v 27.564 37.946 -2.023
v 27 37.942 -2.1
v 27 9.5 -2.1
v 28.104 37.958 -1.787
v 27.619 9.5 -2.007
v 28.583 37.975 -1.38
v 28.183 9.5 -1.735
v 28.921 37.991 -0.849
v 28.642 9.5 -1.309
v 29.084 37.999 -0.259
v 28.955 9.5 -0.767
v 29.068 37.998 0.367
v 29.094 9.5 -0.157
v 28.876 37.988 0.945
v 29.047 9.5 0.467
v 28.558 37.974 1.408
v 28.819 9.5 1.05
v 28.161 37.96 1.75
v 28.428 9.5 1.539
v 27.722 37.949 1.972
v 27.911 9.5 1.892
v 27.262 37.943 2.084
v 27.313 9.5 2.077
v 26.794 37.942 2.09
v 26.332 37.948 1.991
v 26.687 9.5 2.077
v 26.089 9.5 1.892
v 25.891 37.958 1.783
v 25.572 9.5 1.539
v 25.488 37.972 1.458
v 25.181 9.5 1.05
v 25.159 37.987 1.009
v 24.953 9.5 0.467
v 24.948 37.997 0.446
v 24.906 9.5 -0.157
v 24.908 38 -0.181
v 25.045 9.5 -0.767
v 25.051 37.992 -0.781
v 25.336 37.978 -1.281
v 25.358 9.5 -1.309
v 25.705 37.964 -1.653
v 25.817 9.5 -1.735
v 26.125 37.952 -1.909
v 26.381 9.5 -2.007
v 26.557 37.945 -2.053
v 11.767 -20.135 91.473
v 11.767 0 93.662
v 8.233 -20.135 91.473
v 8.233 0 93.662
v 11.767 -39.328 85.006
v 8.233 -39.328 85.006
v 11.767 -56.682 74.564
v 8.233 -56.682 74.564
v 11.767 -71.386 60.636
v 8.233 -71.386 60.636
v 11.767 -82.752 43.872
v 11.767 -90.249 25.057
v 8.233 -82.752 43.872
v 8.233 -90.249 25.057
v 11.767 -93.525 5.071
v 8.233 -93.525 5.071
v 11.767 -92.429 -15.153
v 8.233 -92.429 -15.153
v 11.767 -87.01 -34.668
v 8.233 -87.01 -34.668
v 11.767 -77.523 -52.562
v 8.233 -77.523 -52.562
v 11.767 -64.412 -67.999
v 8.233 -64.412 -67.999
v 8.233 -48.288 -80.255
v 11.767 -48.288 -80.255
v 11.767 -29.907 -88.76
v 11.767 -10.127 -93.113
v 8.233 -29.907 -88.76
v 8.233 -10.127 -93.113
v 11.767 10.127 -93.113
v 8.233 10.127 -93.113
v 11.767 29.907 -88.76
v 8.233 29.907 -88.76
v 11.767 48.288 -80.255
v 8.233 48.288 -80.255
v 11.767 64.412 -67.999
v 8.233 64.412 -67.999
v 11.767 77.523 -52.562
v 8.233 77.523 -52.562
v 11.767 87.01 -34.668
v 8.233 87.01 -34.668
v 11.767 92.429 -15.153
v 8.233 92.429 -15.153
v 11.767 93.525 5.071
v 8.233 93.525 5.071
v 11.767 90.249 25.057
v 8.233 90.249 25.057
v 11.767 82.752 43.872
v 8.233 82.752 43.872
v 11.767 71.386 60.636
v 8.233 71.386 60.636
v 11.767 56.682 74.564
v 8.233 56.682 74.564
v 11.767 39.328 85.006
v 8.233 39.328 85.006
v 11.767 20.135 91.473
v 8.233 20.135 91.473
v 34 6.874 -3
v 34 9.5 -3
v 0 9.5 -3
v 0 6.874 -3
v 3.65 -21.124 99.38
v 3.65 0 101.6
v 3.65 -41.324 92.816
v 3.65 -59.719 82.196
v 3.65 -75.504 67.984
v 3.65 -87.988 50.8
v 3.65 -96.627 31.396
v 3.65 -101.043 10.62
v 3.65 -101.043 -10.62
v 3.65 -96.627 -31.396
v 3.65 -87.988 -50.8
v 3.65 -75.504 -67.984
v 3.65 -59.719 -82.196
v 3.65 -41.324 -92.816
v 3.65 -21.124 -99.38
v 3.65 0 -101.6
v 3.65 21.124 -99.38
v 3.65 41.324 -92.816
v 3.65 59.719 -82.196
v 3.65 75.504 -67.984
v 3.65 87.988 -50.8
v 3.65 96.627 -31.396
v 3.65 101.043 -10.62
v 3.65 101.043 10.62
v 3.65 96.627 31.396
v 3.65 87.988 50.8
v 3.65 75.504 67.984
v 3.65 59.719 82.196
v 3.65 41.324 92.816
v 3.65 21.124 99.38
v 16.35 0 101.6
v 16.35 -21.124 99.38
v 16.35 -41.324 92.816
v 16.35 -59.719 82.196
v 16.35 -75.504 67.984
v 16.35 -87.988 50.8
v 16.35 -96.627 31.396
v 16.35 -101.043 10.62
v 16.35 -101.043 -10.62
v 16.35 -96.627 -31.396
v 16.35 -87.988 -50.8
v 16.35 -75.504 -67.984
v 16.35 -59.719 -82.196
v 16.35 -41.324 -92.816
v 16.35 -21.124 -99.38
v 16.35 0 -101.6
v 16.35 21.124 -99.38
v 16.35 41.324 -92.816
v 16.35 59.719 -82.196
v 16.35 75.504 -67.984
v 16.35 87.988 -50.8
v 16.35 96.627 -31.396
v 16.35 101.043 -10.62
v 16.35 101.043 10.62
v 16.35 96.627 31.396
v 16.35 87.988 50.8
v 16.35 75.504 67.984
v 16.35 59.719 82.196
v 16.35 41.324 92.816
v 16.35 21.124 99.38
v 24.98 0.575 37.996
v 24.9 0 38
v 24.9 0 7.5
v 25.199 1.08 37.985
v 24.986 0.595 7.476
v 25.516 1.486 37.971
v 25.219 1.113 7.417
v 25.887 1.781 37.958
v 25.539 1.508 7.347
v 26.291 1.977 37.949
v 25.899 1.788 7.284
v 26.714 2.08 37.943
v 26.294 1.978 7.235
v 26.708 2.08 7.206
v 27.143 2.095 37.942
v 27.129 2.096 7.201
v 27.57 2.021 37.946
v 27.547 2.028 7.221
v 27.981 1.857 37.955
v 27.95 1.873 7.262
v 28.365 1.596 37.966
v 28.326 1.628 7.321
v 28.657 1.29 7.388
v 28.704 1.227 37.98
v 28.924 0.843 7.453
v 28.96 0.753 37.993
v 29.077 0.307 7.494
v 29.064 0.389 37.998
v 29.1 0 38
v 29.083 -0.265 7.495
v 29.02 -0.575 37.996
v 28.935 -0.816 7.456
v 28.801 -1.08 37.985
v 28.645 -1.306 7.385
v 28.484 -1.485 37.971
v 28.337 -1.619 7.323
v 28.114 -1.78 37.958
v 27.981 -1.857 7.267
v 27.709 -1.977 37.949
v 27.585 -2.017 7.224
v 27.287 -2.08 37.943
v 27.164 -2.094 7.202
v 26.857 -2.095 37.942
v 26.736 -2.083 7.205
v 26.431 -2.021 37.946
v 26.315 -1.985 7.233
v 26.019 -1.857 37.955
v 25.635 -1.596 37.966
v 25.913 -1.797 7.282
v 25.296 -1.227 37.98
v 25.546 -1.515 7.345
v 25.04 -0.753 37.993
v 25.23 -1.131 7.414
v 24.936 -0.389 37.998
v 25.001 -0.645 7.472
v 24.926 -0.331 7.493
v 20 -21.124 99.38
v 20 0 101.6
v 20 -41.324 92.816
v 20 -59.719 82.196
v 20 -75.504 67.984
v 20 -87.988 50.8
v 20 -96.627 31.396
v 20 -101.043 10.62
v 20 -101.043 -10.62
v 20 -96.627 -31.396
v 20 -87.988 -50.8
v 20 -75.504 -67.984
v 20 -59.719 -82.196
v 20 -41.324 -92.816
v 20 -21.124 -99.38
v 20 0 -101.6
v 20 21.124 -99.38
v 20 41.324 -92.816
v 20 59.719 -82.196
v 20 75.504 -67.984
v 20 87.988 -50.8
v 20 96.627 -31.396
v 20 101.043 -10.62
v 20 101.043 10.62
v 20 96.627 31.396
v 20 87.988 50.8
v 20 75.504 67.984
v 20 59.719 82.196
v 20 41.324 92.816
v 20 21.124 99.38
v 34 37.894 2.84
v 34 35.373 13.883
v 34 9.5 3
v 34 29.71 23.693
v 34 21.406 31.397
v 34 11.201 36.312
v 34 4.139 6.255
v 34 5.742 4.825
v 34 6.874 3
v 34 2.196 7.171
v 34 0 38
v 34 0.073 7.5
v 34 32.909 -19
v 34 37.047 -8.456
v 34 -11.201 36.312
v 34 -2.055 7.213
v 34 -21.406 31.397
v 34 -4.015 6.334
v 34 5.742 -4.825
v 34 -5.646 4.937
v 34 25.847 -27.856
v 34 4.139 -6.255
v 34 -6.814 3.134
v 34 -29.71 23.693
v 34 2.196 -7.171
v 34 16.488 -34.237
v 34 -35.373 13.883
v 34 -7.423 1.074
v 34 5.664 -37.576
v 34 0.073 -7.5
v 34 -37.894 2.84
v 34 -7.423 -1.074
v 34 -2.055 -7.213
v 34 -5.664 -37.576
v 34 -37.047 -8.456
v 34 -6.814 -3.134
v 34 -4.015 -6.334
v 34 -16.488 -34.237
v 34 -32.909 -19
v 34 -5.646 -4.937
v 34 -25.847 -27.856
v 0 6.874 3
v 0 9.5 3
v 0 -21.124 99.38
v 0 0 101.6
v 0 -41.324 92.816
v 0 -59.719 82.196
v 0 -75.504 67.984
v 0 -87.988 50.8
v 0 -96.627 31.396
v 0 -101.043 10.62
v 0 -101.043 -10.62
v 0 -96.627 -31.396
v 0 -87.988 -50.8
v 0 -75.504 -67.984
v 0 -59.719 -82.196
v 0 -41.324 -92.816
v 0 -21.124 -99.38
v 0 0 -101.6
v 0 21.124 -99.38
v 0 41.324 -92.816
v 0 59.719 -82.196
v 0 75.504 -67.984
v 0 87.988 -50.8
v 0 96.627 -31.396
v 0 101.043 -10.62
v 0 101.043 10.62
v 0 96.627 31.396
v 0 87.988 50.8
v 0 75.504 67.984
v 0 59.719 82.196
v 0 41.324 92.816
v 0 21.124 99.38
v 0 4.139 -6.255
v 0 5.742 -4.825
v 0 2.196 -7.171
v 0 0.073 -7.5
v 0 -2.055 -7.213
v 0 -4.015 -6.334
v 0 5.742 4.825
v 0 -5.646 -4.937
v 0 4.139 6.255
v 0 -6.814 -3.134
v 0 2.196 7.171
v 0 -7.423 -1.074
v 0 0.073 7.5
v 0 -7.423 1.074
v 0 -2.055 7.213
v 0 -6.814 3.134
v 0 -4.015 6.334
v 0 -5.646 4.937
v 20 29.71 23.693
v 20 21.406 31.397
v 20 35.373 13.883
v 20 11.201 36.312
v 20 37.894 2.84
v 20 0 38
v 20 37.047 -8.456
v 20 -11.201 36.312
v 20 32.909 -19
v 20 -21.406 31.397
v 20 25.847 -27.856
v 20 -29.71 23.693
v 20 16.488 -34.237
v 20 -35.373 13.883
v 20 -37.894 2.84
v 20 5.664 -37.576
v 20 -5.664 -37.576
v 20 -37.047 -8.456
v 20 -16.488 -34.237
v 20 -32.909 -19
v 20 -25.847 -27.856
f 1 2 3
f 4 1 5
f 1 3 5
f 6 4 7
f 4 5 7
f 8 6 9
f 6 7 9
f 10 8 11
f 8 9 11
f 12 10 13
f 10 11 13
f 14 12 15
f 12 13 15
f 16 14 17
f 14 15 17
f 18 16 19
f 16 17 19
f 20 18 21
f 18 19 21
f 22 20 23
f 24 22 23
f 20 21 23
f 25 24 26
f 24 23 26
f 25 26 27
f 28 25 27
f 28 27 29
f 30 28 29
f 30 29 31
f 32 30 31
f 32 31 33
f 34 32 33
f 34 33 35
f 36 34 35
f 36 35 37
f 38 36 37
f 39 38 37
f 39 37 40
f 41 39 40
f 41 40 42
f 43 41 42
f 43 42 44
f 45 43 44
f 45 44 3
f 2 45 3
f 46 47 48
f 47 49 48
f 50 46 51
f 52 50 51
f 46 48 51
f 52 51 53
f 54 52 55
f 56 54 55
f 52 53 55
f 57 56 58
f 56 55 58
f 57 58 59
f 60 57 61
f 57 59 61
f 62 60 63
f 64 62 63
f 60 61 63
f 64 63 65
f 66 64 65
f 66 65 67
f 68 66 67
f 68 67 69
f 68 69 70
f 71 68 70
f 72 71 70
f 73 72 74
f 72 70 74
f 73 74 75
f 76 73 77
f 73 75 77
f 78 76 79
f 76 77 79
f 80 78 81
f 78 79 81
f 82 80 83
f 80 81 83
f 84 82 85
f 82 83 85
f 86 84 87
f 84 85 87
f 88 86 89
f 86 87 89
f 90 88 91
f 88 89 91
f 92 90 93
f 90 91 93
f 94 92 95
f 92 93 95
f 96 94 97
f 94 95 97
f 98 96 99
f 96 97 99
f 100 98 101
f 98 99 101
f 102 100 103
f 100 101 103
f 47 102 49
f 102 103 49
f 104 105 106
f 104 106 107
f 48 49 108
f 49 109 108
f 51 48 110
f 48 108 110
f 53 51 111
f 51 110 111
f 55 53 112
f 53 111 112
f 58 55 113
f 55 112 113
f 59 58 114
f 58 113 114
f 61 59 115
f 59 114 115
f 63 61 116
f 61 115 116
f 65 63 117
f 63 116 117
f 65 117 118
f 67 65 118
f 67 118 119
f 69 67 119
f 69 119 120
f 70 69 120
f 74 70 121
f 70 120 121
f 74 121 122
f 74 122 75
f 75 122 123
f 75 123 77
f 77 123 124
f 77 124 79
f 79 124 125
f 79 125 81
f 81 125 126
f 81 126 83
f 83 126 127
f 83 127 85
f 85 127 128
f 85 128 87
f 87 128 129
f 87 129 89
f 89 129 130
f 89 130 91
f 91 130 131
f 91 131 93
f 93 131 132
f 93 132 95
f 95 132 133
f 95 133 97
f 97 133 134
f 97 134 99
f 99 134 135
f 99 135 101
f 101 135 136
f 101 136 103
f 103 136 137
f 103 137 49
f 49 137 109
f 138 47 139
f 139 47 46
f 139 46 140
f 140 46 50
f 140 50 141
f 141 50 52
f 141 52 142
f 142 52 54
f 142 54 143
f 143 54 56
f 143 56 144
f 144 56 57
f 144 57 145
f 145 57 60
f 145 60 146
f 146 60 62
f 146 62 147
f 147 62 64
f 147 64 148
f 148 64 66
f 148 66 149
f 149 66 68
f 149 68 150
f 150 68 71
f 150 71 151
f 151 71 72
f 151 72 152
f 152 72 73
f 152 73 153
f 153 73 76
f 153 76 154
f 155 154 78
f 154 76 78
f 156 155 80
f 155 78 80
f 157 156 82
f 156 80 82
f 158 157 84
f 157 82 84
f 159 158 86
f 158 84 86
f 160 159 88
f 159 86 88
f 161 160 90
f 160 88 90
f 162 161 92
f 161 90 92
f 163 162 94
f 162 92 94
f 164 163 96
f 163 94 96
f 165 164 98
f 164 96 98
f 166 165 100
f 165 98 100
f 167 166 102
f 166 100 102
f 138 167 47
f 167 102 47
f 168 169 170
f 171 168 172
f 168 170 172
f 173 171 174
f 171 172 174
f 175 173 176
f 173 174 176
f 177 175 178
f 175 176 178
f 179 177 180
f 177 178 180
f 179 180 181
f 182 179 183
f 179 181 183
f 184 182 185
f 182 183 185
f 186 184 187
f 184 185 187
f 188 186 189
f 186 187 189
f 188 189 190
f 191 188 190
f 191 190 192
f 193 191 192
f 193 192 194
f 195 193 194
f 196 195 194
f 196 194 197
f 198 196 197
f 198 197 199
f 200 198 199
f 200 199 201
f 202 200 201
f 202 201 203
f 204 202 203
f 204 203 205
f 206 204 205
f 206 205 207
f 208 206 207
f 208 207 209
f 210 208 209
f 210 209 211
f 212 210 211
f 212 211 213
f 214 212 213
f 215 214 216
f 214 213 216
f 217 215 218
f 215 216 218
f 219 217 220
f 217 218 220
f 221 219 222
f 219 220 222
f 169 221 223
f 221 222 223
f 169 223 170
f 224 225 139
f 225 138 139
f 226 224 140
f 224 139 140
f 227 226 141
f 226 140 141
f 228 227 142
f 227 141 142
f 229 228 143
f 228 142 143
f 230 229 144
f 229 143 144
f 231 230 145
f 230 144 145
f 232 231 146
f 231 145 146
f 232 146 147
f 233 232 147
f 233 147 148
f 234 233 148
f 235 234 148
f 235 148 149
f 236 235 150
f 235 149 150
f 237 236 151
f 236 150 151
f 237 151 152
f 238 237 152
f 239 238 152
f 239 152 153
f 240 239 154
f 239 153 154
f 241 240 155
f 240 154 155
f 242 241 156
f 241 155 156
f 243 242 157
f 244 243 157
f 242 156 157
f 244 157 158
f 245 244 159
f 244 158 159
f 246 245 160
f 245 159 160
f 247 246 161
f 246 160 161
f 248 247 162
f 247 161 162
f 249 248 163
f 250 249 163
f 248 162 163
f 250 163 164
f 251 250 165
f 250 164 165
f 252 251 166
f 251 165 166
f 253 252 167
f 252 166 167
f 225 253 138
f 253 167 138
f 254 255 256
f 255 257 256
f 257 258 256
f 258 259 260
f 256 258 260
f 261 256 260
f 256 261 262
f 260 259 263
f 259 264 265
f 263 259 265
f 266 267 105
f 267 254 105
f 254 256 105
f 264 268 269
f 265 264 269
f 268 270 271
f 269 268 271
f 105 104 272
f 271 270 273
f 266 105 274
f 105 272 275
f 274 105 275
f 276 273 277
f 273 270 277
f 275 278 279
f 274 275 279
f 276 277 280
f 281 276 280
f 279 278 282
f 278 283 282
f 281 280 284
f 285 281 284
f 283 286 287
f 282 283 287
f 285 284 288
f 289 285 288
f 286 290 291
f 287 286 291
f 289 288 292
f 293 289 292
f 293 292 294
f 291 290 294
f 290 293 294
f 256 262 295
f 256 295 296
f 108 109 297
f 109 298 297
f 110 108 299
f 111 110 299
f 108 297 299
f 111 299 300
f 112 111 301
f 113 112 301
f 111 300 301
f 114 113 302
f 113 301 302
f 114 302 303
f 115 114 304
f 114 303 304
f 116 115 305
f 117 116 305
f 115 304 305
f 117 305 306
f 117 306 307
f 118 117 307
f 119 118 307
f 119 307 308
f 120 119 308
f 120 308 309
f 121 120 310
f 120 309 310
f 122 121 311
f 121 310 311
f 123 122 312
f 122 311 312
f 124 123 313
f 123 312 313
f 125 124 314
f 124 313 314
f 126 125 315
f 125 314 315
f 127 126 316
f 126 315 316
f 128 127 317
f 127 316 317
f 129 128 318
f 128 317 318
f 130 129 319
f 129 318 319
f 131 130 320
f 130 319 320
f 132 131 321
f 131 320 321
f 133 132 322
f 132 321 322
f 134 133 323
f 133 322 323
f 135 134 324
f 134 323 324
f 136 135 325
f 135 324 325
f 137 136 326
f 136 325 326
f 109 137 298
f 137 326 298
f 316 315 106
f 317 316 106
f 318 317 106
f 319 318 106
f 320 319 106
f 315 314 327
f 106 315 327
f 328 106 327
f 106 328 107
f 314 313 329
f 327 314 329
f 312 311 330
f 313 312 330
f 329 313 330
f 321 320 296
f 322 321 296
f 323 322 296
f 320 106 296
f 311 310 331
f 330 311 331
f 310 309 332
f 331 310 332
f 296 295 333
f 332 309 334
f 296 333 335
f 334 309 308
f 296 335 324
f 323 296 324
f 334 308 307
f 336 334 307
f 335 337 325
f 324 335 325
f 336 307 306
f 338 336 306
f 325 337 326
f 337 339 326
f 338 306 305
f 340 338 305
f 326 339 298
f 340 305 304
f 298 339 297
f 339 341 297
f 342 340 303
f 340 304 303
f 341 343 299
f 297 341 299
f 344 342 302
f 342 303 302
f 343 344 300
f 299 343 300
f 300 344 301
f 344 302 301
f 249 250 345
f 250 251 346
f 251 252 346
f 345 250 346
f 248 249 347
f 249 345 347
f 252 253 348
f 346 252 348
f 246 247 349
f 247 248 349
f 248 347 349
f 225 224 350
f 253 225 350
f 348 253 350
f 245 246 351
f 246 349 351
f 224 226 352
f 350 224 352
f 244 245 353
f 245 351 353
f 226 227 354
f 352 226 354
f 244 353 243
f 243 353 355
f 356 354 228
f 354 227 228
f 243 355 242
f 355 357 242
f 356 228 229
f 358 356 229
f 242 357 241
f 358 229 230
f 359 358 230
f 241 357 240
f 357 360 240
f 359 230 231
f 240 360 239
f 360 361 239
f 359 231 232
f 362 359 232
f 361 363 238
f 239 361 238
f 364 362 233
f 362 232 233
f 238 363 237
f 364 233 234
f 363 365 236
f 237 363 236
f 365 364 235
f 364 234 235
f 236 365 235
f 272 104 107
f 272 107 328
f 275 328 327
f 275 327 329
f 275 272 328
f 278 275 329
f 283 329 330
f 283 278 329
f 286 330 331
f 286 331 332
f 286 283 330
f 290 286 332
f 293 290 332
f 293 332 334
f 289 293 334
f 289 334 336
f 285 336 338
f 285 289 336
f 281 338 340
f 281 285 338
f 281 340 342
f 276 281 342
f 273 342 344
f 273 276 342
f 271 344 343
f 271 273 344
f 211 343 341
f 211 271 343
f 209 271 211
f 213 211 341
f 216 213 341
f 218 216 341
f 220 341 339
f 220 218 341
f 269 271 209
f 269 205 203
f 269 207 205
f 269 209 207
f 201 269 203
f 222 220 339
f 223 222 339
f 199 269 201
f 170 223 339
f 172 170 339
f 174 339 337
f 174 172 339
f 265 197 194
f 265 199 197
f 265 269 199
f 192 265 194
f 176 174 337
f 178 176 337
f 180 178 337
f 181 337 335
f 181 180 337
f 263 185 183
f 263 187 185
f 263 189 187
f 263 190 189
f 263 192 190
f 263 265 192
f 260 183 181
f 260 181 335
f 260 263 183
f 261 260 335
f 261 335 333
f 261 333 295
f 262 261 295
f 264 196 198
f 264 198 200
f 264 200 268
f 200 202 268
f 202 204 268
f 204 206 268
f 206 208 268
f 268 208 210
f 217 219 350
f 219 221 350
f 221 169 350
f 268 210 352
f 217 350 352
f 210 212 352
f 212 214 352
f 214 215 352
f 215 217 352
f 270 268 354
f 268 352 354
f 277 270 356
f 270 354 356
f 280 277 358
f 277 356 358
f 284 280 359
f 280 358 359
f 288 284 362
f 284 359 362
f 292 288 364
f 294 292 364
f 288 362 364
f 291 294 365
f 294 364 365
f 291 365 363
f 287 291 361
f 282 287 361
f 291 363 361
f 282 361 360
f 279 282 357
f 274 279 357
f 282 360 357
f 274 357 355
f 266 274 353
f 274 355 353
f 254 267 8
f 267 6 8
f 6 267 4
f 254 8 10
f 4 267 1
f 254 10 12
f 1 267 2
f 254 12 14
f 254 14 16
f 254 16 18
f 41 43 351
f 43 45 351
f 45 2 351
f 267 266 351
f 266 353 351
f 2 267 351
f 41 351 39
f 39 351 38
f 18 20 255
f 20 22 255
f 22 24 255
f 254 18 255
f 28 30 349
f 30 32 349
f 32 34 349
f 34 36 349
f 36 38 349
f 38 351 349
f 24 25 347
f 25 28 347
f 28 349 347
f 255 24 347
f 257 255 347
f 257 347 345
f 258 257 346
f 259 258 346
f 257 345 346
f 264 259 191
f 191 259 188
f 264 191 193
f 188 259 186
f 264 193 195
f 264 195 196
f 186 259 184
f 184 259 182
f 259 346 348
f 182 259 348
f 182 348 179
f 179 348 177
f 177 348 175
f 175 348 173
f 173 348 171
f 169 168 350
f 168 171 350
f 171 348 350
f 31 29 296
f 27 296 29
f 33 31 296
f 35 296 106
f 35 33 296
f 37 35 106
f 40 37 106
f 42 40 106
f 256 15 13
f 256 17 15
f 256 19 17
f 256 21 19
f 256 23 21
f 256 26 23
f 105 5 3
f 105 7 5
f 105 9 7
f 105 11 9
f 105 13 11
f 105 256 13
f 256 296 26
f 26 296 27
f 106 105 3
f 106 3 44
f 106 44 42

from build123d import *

# Parameters (mm, degrees)
CORTAR_EXTRUIR1_DEPTH                          = 34
PERFORADOR_PARA_ROSCAR_PARA_MACHO_DE_ROS_D     = 4.2
PERFORADOR_PARA_ROSCAR_PARA_MACHO_DE_ROS_DEPTH = 40
PERFORADOR_PARA_ROSCAR_PARA_MACHO_DE_ROS_TIP   = 1.2618073
PERFORADOR_PARA_ROSCAR_PARA_MACHO_DE_2_D       = 4.2
PERFORADOR_PARA_ROSCAR_PARA_MACHO_DE_2_DEPTH   = 40
PERFORADOR_PARA_ROSCAR_PARA_MACHO_DE_2_TIP     = 1.2618073


with BuildPart() as part:
    # Croquis1 → Revolución1 (revolve)
    with BuildSketch(Plane.XY, mode=Mode.PRIVATE) as revoluci_n1_sk:
        Polygon((0, 0), (34, 0), (34, 38), (20, 38), (20, 101.6), (16.35, 101.6), (11.767282238, 93.6625), (8.232717762, 93.6625), (3.65, 101.6), (0, 101.6), align=None)
    revolve(revoluci_n1_sk.sketch.rotate(Axis((0, 0, 0), (1, 0, 0)), 90), axis=Axis((0, 0, 0), (1, 0, 0)))

    # Croquis2 → Cortar-Extruir1 (cut)
    with BuildSketch(Plane(origin=(34, 0, 0), x_dir=(0, 0, -1), z_dir=(1, 0, 0))):
        with BuildLine():
            Line((-3, 9.5), (3, 9.5))
            Line((3, 9.5), (3, 6.873863542))
            ThreePointArc((3, 6.873863542), (0, -7.5), (-3, 6.873863542))
            Line((-3, 6.873863542), (-3, 9.5))
        make_face()
    extrude(amount=-CORTAR_EXTRUIR1_DEPTH, mode=Mode.SUBTRACT)

    # Perforador para roscar para macho de roscar para M51
    with Locations(Plane(origin=(27, 0, 38), x_dir=(1, 0, 0), z_dir=(0, 0, 1))):
        with Locations((0, 0)):
            Hole(PERFORADOR_PARA_ROSCAR_PARA_MACHO_DE_ROS_D / 2, depth=PERFORADOR_PARA_ROSCAR_PARA_MACHO_DE_ROS_DEPTH)
            with Locations((0, 0, -(PERFORADOR_PARA_ROSCAR_PARA_MACHO_DE_ROS_DEPTH + PERFORADOR_PARA_ROSCAR_PARA_MACHO_DE_ROS_TIP / 2))):  # 118° drill point
                Cone(0, PERFORADOR_PARA_ROSCAR_PARA_MACHO_DE_ROS_D / 2, PERFORADOR_PARA_ROSCAR_PARA_MACHO_DE_ROS_TIP, mode=Mode.SUBTRACT)

    # Perforador para roscar para macho de 2
    with Locations(Plane(origin=(27, 38, 0), x_dir=(0, 0, 1), z_dir=(0, 1, 0))):
        with Locations((0, 0)):
            Hole(PERFORADOR_PARA_ROSCAR_PARA_MACHO_DE_2_D / 2, depth=PERFORADOR_PARA_ROSCAR_PARA_MACHO_DE_2_DEPTH)
            with Locations((0, 0, -(PERFORADOR_PARA_ROSCAR_PARA_MACHO_DE_2_DEPTH + PERFORADOR_PARA_ROSCAR_PARA_MACHO_DE_2_TIP / 2))):  # 118° drill point
                Cone(0, PERFORADOR_PARA_ROSCAR_PARA_MACHO_DE_2_D / 2, PERFORADOR_PARA_ROSCAR_PARA_MACHO_DE_2_TIP, mode=Mode.SUBTRACT)


solid = part.part
